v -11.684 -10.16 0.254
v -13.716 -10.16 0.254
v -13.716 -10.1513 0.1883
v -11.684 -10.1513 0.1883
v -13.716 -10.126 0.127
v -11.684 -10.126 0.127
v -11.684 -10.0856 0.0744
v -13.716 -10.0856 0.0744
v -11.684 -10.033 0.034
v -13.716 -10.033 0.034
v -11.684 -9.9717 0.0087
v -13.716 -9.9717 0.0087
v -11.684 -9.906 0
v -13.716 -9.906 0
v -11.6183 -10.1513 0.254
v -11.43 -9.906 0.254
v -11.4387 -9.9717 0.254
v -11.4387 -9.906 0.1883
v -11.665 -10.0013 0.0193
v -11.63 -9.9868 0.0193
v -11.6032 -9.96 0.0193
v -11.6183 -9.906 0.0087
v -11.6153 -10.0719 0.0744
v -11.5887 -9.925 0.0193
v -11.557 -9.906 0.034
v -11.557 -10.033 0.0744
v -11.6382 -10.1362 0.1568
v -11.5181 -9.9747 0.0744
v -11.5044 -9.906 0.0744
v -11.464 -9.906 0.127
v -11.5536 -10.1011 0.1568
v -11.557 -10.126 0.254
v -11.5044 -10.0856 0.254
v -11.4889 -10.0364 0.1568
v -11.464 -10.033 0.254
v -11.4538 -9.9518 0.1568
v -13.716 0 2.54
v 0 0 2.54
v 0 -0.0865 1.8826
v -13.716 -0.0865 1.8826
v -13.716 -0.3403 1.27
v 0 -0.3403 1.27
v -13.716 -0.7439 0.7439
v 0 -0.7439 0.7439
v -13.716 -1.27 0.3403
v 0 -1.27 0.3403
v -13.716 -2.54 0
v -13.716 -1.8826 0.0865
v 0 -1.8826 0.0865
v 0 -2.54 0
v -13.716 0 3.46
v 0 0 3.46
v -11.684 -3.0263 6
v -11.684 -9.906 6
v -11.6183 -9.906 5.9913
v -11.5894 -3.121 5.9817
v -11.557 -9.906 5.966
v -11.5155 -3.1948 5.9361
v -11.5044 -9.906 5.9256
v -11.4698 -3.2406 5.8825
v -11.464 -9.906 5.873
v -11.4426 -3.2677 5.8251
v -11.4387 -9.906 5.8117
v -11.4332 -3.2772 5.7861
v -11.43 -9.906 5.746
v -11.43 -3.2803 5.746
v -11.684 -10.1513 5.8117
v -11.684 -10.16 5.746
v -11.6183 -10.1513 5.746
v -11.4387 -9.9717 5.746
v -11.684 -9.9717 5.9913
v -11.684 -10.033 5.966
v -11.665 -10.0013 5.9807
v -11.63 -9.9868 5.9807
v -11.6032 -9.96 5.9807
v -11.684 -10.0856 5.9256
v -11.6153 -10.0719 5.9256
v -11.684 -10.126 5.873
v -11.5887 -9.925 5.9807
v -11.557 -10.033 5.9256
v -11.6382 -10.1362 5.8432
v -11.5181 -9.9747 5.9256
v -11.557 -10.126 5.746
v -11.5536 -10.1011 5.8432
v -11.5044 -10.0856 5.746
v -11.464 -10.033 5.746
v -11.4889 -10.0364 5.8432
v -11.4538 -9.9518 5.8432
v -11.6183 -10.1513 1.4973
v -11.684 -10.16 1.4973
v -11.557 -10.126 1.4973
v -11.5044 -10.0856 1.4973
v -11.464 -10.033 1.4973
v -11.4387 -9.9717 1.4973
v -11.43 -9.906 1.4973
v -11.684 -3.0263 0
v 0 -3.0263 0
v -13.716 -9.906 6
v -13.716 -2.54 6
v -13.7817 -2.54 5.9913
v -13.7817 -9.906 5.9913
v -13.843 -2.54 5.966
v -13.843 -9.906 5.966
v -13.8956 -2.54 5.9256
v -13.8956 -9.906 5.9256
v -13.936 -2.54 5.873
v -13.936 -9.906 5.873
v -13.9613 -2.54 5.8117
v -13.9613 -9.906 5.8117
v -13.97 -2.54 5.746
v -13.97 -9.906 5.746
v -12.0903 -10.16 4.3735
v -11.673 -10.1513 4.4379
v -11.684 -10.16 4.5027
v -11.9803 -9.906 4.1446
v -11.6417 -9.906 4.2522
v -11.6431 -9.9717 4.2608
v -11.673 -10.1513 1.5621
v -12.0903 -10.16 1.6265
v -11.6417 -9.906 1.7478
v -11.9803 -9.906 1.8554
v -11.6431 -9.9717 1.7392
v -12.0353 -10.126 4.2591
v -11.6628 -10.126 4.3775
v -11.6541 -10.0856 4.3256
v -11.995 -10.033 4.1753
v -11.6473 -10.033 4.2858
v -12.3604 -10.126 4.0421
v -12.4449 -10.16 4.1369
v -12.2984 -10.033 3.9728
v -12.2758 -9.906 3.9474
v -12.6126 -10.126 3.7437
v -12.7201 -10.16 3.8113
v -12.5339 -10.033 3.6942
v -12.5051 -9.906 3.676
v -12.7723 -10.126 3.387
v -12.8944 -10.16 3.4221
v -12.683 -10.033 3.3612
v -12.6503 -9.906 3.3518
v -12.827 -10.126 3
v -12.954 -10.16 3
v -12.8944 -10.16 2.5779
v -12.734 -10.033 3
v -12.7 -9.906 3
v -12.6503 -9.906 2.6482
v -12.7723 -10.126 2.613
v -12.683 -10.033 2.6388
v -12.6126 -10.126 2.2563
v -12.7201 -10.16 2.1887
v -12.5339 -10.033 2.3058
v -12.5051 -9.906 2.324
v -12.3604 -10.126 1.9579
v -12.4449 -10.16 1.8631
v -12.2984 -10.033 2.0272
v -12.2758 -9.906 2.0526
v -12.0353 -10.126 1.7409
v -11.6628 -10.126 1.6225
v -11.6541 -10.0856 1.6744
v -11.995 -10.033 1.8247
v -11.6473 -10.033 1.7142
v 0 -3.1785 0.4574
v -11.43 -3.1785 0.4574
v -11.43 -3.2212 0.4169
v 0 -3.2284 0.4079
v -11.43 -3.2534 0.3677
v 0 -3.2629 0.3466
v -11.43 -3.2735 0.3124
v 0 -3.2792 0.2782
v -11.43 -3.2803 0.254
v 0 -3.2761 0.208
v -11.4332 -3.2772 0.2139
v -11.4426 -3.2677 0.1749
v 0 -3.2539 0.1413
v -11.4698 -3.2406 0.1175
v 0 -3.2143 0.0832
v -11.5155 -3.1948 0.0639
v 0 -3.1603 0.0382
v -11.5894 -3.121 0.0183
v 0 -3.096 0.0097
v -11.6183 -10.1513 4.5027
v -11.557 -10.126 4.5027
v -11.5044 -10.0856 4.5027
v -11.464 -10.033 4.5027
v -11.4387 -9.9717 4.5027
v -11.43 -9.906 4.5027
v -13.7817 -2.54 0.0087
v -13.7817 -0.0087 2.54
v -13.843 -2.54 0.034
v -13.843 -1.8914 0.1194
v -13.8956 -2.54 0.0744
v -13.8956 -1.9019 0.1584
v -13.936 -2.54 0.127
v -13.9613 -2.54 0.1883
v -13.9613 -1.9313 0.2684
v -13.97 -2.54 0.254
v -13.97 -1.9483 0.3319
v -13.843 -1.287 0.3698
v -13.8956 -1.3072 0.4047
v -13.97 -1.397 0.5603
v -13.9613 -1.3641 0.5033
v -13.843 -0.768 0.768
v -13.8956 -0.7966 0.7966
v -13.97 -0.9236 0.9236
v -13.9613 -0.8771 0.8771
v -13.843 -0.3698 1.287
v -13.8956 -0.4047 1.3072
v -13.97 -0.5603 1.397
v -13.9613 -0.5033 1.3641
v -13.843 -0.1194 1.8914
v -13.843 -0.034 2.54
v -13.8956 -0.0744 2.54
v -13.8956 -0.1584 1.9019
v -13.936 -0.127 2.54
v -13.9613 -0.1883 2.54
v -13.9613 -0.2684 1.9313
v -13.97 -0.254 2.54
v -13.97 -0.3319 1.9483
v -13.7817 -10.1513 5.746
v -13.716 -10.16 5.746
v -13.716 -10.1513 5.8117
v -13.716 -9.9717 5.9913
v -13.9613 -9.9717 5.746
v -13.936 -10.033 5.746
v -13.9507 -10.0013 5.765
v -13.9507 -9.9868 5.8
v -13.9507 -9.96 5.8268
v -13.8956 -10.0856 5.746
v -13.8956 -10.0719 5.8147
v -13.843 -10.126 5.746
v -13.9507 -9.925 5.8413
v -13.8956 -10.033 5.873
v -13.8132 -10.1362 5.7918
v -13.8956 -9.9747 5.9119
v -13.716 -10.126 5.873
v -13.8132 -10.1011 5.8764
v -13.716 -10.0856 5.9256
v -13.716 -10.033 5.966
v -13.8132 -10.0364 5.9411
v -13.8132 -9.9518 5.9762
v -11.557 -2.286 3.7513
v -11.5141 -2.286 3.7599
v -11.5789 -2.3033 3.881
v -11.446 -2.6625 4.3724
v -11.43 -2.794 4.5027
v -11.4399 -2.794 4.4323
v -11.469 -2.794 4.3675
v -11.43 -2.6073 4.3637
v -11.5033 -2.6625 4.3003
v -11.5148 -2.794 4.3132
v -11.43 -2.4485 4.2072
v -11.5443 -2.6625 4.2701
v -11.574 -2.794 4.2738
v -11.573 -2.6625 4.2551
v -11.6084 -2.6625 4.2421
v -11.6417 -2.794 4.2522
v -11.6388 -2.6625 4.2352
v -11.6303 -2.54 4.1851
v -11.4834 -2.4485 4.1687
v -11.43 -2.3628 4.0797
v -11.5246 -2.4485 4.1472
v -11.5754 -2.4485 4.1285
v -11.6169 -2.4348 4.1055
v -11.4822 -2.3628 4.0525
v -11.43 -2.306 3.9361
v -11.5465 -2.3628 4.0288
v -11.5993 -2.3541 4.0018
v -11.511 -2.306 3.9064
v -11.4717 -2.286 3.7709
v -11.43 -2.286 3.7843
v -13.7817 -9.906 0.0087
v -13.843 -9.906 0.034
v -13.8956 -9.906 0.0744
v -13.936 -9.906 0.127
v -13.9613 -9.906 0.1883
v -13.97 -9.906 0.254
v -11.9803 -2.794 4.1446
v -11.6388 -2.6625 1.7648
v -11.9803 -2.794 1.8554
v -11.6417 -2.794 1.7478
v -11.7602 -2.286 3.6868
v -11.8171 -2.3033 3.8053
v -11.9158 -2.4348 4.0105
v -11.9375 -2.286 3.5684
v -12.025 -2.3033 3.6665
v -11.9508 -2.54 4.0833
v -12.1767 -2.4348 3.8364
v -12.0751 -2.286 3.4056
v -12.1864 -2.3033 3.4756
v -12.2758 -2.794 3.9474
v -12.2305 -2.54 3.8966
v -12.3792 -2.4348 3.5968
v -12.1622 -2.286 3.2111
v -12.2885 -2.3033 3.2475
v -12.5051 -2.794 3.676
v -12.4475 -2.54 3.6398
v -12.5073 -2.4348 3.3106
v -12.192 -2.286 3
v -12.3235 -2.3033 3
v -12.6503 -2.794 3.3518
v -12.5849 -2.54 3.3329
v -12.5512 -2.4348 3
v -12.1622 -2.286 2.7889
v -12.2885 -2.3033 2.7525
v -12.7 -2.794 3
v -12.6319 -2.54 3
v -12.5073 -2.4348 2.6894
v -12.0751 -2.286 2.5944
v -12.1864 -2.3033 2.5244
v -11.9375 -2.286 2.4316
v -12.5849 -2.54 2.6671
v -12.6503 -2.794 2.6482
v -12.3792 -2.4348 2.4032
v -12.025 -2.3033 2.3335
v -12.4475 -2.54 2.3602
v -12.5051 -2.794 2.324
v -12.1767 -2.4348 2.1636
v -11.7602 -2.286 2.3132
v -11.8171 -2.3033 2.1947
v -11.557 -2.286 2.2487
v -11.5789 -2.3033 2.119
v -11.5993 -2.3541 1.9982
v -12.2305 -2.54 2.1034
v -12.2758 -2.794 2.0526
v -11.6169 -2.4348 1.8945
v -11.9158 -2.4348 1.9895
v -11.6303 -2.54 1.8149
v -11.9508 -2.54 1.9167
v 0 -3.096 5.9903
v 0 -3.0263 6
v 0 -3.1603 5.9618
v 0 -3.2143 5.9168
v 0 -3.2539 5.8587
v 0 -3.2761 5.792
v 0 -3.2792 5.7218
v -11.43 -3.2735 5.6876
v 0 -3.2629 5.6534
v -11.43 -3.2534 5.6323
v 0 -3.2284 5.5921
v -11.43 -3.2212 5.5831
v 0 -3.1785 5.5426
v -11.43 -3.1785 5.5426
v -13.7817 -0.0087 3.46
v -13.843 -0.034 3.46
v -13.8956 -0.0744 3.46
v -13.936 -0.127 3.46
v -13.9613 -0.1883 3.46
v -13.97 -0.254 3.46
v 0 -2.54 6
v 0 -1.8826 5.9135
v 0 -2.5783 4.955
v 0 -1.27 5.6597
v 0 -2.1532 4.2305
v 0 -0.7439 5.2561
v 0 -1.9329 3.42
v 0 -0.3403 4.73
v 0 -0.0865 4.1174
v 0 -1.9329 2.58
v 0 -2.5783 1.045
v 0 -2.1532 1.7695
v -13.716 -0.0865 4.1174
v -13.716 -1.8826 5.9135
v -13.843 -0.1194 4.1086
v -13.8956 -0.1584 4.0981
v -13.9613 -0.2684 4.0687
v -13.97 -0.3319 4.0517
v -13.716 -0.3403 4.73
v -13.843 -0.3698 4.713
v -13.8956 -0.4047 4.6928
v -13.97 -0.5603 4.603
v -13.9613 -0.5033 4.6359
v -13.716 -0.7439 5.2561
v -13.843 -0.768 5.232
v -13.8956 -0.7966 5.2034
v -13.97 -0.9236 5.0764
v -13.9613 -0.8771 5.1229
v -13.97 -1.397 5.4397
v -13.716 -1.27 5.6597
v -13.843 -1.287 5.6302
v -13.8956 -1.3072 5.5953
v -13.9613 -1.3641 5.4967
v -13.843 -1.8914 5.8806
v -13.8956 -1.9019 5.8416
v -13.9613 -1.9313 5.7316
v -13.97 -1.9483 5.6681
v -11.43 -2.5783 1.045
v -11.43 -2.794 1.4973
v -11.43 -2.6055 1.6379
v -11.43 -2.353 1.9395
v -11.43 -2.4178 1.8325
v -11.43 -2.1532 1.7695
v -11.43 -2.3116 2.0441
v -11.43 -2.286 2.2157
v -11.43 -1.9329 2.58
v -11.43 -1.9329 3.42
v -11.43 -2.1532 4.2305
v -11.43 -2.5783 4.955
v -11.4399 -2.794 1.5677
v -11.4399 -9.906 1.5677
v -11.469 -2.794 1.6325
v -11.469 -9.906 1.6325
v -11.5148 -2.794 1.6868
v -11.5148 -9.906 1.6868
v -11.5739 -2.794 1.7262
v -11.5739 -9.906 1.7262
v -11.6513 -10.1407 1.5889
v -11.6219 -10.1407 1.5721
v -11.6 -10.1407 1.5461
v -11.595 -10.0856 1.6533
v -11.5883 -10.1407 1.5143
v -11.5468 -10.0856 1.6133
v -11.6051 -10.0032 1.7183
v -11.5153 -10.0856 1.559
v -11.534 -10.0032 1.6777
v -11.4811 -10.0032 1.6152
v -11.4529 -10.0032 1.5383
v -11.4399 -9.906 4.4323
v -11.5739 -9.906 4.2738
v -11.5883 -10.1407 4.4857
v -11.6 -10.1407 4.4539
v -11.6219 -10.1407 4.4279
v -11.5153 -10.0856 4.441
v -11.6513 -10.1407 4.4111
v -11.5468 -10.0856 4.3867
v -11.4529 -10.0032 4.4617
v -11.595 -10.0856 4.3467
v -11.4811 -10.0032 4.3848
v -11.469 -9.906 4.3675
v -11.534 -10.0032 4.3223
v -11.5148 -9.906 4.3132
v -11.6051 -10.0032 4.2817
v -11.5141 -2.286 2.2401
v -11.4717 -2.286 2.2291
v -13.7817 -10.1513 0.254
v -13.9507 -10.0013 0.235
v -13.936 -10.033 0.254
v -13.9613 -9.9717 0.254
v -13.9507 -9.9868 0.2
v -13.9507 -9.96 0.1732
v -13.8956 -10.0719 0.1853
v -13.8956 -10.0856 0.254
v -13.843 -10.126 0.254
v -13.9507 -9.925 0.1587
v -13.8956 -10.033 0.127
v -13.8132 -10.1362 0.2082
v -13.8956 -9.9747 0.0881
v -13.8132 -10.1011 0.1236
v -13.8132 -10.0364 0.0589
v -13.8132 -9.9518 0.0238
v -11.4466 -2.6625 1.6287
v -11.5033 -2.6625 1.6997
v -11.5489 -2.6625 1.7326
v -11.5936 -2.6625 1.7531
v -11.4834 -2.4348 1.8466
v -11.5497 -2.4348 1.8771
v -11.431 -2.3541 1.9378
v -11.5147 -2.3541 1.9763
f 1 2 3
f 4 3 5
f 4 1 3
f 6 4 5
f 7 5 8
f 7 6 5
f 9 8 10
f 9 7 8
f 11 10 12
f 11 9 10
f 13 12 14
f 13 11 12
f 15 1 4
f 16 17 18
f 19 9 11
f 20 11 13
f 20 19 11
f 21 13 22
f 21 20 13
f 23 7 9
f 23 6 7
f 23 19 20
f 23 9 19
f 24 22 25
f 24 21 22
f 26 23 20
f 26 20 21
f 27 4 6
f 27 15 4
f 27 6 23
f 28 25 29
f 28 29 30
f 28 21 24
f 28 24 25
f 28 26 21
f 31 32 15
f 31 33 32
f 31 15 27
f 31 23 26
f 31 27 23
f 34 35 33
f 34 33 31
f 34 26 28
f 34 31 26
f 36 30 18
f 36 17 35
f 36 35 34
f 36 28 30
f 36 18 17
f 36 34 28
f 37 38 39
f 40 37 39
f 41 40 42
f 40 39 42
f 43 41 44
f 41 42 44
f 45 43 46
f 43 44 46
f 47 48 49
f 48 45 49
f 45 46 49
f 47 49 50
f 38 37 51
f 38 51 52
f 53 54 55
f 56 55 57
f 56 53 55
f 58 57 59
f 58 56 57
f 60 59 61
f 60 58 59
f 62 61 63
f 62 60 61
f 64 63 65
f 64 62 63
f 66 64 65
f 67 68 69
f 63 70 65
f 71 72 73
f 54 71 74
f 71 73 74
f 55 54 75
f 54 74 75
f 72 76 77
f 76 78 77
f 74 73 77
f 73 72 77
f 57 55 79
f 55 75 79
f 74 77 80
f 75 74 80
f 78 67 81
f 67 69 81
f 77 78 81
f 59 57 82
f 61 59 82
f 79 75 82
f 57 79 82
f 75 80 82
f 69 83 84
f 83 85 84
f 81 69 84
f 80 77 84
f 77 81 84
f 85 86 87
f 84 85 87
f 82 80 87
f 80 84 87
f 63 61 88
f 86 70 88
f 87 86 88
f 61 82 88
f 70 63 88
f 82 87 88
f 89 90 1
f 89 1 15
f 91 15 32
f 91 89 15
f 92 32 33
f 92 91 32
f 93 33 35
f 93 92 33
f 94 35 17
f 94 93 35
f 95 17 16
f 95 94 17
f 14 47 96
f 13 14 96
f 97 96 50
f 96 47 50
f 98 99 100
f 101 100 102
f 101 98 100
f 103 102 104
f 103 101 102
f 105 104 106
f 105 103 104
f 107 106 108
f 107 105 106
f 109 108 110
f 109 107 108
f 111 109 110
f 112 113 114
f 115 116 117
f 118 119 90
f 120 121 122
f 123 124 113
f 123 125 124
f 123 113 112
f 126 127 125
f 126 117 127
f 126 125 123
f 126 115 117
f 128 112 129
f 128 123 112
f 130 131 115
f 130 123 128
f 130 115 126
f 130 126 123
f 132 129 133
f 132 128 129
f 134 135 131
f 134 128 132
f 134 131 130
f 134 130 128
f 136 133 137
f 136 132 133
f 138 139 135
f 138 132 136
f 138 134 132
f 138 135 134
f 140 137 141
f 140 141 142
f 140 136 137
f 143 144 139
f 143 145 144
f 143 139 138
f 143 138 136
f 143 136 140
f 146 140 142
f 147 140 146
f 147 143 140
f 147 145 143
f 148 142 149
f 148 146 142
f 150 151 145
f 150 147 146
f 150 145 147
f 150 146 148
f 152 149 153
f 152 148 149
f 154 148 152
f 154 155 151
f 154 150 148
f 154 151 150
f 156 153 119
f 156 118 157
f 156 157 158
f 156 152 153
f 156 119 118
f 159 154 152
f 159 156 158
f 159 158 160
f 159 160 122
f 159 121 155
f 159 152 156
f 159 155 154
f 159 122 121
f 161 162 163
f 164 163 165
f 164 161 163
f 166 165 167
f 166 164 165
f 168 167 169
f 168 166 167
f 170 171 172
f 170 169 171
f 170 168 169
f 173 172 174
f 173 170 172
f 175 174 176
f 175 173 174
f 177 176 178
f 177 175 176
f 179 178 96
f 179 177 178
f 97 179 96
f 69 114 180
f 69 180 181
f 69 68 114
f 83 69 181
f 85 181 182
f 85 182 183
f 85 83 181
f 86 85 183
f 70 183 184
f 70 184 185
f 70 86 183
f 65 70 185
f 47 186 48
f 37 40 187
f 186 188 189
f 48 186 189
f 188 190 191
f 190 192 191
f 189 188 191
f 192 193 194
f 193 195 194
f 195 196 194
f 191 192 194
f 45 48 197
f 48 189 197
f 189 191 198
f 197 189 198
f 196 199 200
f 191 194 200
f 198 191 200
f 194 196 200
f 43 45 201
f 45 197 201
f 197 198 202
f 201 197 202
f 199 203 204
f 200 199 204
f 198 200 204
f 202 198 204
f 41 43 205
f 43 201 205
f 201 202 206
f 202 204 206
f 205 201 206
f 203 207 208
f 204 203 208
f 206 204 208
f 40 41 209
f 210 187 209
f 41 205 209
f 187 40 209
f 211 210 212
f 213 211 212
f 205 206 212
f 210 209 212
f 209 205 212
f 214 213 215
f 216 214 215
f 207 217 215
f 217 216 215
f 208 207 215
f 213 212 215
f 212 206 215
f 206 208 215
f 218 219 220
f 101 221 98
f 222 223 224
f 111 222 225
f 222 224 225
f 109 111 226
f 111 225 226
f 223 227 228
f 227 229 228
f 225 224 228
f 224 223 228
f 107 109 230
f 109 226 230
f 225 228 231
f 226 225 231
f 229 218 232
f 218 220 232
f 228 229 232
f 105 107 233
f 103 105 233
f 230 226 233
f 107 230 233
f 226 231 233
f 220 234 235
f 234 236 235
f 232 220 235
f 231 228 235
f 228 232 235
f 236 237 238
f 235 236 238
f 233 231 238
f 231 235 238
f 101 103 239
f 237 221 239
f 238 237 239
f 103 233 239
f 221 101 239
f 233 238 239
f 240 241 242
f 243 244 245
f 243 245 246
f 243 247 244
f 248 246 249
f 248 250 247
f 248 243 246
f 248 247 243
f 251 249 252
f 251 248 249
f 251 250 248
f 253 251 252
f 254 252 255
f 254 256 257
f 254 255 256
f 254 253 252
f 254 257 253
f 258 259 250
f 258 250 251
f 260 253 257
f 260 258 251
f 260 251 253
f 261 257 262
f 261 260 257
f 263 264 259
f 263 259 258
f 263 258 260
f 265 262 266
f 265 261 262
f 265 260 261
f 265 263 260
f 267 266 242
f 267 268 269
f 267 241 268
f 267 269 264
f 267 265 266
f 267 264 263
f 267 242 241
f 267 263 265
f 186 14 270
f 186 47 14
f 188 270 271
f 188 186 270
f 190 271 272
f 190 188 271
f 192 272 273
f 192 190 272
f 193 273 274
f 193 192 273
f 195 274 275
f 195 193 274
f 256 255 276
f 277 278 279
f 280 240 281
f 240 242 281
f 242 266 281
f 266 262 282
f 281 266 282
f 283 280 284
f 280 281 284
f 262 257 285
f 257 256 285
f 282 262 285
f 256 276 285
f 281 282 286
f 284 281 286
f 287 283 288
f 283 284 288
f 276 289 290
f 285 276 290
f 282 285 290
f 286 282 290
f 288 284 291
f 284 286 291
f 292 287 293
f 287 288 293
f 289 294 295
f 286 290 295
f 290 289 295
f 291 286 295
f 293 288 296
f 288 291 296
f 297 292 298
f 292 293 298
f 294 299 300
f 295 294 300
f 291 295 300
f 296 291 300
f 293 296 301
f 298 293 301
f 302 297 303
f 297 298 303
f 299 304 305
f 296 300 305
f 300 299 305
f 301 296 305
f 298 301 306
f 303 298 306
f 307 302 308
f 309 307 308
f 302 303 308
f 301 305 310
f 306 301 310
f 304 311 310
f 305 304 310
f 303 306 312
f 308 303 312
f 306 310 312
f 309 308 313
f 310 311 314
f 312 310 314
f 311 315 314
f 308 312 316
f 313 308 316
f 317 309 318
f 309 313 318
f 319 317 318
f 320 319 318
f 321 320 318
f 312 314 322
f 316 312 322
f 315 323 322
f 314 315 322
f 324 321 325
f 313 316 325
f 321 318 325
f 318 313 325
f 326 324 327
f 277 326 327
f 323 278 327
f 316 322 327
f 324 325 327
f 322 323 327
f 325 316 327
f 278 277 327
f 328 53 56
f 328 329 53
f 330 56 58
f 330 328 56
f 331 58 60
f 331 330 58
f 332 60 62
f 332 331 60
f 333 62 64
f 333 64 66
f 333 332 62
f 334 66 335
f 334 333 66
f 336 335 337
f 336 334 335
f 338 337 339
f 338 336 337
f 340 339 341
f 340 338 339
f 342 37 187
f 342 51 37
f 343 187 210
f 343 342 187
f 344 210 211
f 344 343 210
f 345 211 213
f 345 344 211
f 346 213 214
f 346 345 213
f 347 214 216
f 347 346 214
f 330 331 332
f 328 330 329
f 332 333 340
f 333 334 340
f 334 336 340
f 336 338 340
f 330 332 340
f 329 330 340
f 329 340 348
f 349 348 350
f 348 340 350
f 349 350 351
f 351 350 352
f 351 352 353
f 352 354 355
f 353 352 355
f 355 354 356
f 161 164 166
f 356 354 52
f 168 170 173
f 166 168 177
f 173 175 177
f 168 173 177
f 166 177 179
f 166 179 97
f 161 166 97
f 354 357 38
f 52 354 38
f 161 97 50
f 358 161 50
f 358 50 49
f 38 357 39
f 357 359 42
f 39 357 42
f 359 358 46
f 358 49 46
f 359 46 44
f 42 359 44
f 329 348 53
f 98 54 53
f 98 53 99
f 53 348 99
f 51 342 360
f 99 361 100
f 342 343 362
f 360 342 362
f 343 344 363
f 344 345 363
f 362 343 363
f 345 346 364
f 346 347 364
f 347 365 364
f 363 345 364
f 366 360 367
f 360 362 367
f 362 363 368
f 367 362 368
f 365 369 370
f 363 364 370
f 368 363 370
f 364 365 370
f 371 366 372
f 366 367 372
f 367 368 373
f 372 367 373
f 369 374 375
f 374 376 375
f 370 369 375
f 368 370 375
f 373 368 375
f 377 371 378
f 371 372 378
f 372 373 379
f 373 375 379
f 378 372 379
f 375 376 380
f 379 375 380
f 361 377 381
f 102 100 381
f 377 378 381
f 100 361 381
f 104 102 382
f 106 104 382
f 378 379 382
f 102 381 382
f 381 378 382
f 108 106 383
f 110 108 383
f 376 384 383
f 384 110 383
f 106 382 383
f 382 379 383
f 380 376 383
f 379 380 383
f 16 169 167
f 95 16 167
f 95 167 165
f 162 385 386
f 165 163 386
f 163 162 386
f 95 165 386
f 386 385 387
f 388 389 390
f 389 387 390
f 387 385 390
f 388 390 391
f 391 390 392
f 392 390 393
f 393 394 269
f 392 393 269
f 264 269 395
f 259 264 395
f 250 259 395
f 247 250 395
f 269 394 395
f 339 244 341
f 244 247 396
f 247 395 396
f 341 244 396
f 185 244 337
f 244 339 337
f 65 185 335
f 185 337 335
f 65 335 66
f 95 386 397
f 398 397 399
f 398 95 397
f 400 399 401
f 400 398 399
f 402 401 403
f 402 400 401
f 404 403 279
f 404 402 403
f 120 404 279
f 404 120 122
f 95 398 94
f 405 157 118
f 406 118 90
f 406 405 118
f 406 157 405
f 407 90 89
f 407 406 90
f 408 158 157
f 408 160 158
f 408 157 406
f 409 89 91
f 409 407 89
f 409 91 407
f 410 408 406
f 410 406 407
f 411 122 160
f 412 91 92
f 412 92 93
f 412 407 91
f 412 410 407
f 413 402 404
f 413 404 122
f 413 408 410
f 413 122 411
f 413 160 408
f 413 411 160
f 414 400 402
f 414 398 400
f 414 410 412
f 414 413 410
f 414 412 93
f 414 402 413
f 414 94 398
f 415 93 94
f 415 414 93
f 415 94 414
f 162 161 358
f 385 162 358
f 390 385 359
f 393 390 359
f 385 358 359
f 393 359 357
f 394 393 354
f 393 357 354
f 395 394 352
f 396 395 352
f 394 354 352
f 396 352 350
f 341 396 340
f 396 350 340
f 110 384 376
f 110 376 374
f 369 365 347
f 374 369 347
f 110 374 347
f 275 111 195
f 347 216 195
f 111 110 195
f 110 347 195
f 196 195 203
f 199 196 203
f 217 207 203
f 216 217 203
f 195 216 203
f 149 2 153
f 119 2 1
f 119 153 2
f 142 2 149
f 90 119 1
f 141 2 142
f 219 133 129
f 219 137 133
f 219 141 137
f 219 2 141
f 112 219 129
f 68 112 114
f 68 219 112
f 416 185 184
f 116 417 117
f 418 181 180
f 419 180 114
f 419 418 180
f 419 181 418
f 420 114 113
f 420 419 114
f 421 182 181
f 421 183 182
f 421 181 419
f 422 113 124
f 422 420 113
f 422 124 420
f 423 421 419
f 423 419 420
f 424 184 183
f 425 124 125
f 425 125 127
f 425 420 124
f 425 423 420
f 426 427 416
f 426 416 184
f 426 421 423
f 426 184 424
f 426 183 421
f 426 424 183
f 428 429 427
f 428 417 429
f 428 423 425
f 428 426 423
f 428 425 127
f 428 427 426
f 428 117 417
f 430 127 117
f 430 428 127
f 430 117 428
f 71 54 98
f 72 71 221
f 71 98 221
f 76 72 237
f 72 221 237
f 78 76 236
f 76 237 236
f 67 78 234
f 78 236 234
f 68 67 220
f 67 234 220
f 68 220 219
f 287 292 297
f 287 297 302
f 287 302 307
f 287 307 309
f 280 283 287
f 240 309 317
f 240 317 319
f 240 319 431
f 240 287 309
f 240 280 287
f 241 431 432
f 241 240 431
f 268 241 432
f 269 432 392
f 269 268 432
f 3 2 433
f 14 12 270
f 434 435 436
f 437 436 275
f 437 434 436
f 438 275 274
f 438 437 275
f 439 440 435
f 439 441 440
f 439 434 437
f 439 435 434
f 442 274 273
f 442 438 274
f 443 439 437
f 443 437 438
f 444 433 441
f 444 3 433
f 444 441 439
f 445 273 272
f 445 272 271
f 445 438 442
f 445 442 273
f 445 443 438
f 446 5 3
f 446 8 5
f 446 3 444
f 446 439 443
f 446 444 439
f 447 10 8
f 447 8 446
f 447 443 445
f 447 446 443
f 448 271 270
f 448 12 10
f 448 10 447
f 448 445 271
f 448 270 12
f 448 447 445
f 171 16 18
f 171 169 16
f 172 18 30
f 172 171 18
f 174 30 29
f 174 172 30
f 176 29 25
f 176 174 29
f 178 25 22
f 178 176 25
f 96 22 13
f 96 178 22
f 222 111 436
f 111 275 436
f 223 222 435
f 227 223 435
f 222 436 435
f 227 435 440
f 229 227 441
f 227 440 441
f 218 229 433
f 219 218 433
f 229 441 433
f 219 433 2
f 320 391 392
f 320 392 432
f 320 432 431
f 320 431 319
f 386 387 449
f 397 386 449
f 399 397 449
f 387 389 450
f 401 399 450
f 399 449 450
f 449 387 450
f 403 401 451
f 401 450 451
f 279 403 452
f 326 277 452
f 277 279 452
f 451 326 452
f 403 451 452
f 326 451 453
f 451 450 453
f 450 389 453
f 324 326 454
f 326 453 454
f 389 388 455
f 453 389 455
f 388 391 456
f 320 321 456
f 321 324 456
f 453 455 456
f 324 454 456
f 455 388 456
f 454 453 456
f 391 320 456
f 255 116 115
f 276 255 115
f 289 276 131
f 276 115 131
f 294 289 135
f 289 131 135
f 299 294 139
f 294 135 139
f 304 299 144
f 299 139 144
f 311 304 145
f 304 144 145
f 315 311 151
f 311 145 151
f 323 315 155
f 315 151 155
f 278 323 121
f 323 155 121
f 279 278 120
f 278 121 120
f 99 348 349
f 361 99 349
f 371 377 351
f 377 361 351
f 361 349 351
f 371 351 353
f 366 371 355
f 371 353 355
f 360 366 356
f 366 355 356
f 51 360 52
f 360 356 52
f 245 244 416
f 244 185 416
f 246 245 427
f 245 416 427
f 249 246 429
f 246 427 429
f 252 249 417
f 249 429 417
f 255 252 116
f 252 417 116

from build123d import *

# Parameters (mm, degrees)
F0_W          = 13.97
F0_H          = 5.08
F1_DEPTH      = 6
F3_DEPTH      = 5.08
F4_R          = 3.175
F5_DEPTH      = 11.43
F6_R          = 1.27
F7_DEPTH      = 7.874
F8_R          = 2.54
F9_R          = 0.254
F10_T2_ANGLE  = 160.8118635463
F10_T6_ANGLE  = 359.64
F10_T11_ANGLE = 359.64


# Not quite as in the source:
# - a fillet or chamfer that OpenCascade refuses, or shapes differently, is made with other operations: its cross-section is extruded or revolved along the edge and cut away or added


with BuildPart() as f1:
    # F0 (on Top) → F1 (new body)
    with BuildSketch(Plane.XY):
        with Locations((-6.985, -2.54)):
            Rectangle(F0_W, F0_H)
    extrude(amount=F1_DEPTH)

    # F2 (on face) → F3 (join)
    with BuildSketch(Plane.XZ.offset(5.08)):
        Polygon((-11.43, 6), (-13.97, 6), (-13.97, 0), (-11.43, 0), (-11.43, 1.7556592107), align=None)
    extrude(amount=F3_DEPTH)

    # F4 (on face) → F5 (cut)
    with BuildSketch(Plane.YZ):
        with Locations((-5.08, 3)):
            Circle(F4_R)
    extrude(amount=-F5_DEPTH, mode=Mode.SUBTRACT)

    # F6 (on face) → F7 (cut)
    with BuildSketch(Plane.XZ.offset(10.16)):
        with Locations((-11.43, 3)):
            Circle(F6_R)
    extrude(amount=-F7_DEPTH, mode=Mode.SUBTRACT)

    # F8
    f8_edges = [f1.edges().sort_by_distance(p)[0] for p in [
        (-6.985, 0, 6),
        (-6.985, 0, 0),
    ]]
    fillet(f8_edges, radius=F8_R)

    # F9
    f9_edges = [f1.edges().sort_by_distance(p)[0] for p in [
        (-11.43, -10.16, 5.135),
        (-12.7, -10.16, 6),
        (-12.7, -10.16, 3),
        (-11.43, -10.16, 0.865),
        (-12.7, -10.16, 0),
        (-13.97, -10.16, 3),
        (-13.97, -6.35, 6),
        (-11.43, -7.100234, 6),
        (-11.43, -7.100234, 0),
        (-11.43, -6.223, 1.73),
        (-11.43, -6.223, 4.27),
        (-5.715, -4.040469, 6),
        (-5.715, -4.040469, 0),
        (-13.97, -6.35, 0),
        (-13.97, -0.743949, 0.743949),
        (-13.97, 0, 3),
        (-13.97, -0.743949, 5.256051),
    ]]
    fillet(f9_edges, radius=F9_R)

    # F10: fillet of radius 0.508 on 1 edges, made by hand

    # F10_s1 → F10_t2 (revolve)
    with BuildSketch(Plane(origin=(-10.6194933514, 0, -1.7950219978), x_dir=(0, 1, 0), z_dir=(0.9860132972, 0, 0.1666666667))):
        with BuildLine():
            ThreePointArc((-2.286, 5.6250398915), (-2.4347897552, 5.9842501364), (-2.794, 6.1330398915))
            Line((-2.794, 6.1330398915), (-2.286, 6.1330398915))
            Line((-2.286, 6.1330398915), (-2.286, 5.6250398915))
        make_face()
    revolve(axis=Axis((-11.43, -2.286, 3), (0, -1, 0)), revolution_arc=F10_T2_ANGLE)


with BuildPart() as f10_tool4:
    # F10_s5 → F10_t6 (revolve)
    with BuildSketch(Plane(origin=(-10.6699629137, 0, -1.7346683419), x_dir=(0, 1, 0), z_dir=(0.9870410248, 0, 0.1604681133))):
        with BuildLine():
            ThreePointArc((-2.794, 6.065243527), (-2.4347897552, 5.9164537719), (-2.286, 5.557243527))
            Line((-2.286, 5.557243527), (-2.286, 6.065243527))
            Line((-2.286, 6.065243527), (-2.794, 6.065243527))
        make_face()
    revolve(axis=Axis((-11.684, -2.286, 4.5026842649), (0, 1, 0)), revolution_arc=F10_T6_ANGLE)

    split(bisect_by=Plane.YZ.offset(-11.43), keep=Keep.BOTTOM)


with BuildPart() as f1_1:
    add(f1.part)

    # F10_t3: union F10_tool4
    add(f10_tool4.part)


with BuildPart() as f10_tool9:
    # F10_s10 → F10_t11 (revolve)
    with BuildSketch(Plane(origin=(-11.6202945797, 0, 1.8891684342), x_dir=(0, 1, 0), z_dir=(0.9870410248, 0, -0.1604681133))):
        with BuildLine():
            ThreePointArc((-2.794, -0.1429973783), (-2.4347897552, 0.0057923768), (-2.286, 0.3650026217))
            Line((-2.286, 0.3650026217), (-2.286, -0.1429973783))
            Line((-2.286, -0.1429973783), (-2.794, -0.1429973783))
        make_face()
    revolve(axis=Axis((-11.684, -2.286, 1.4973157351), (0, -1, 0)), revolution_arc=F10_T11_ANGLE)

    split(bisect_by=Plane.YZ.offset(-11.43), keep=Keep.BOTTOM)


with BuildPart() as f1_2:
    add(f1_1.part)

    # F10_t8: union F10_tool9
    add(f10_tool9.part)


solid = f1_2.part
